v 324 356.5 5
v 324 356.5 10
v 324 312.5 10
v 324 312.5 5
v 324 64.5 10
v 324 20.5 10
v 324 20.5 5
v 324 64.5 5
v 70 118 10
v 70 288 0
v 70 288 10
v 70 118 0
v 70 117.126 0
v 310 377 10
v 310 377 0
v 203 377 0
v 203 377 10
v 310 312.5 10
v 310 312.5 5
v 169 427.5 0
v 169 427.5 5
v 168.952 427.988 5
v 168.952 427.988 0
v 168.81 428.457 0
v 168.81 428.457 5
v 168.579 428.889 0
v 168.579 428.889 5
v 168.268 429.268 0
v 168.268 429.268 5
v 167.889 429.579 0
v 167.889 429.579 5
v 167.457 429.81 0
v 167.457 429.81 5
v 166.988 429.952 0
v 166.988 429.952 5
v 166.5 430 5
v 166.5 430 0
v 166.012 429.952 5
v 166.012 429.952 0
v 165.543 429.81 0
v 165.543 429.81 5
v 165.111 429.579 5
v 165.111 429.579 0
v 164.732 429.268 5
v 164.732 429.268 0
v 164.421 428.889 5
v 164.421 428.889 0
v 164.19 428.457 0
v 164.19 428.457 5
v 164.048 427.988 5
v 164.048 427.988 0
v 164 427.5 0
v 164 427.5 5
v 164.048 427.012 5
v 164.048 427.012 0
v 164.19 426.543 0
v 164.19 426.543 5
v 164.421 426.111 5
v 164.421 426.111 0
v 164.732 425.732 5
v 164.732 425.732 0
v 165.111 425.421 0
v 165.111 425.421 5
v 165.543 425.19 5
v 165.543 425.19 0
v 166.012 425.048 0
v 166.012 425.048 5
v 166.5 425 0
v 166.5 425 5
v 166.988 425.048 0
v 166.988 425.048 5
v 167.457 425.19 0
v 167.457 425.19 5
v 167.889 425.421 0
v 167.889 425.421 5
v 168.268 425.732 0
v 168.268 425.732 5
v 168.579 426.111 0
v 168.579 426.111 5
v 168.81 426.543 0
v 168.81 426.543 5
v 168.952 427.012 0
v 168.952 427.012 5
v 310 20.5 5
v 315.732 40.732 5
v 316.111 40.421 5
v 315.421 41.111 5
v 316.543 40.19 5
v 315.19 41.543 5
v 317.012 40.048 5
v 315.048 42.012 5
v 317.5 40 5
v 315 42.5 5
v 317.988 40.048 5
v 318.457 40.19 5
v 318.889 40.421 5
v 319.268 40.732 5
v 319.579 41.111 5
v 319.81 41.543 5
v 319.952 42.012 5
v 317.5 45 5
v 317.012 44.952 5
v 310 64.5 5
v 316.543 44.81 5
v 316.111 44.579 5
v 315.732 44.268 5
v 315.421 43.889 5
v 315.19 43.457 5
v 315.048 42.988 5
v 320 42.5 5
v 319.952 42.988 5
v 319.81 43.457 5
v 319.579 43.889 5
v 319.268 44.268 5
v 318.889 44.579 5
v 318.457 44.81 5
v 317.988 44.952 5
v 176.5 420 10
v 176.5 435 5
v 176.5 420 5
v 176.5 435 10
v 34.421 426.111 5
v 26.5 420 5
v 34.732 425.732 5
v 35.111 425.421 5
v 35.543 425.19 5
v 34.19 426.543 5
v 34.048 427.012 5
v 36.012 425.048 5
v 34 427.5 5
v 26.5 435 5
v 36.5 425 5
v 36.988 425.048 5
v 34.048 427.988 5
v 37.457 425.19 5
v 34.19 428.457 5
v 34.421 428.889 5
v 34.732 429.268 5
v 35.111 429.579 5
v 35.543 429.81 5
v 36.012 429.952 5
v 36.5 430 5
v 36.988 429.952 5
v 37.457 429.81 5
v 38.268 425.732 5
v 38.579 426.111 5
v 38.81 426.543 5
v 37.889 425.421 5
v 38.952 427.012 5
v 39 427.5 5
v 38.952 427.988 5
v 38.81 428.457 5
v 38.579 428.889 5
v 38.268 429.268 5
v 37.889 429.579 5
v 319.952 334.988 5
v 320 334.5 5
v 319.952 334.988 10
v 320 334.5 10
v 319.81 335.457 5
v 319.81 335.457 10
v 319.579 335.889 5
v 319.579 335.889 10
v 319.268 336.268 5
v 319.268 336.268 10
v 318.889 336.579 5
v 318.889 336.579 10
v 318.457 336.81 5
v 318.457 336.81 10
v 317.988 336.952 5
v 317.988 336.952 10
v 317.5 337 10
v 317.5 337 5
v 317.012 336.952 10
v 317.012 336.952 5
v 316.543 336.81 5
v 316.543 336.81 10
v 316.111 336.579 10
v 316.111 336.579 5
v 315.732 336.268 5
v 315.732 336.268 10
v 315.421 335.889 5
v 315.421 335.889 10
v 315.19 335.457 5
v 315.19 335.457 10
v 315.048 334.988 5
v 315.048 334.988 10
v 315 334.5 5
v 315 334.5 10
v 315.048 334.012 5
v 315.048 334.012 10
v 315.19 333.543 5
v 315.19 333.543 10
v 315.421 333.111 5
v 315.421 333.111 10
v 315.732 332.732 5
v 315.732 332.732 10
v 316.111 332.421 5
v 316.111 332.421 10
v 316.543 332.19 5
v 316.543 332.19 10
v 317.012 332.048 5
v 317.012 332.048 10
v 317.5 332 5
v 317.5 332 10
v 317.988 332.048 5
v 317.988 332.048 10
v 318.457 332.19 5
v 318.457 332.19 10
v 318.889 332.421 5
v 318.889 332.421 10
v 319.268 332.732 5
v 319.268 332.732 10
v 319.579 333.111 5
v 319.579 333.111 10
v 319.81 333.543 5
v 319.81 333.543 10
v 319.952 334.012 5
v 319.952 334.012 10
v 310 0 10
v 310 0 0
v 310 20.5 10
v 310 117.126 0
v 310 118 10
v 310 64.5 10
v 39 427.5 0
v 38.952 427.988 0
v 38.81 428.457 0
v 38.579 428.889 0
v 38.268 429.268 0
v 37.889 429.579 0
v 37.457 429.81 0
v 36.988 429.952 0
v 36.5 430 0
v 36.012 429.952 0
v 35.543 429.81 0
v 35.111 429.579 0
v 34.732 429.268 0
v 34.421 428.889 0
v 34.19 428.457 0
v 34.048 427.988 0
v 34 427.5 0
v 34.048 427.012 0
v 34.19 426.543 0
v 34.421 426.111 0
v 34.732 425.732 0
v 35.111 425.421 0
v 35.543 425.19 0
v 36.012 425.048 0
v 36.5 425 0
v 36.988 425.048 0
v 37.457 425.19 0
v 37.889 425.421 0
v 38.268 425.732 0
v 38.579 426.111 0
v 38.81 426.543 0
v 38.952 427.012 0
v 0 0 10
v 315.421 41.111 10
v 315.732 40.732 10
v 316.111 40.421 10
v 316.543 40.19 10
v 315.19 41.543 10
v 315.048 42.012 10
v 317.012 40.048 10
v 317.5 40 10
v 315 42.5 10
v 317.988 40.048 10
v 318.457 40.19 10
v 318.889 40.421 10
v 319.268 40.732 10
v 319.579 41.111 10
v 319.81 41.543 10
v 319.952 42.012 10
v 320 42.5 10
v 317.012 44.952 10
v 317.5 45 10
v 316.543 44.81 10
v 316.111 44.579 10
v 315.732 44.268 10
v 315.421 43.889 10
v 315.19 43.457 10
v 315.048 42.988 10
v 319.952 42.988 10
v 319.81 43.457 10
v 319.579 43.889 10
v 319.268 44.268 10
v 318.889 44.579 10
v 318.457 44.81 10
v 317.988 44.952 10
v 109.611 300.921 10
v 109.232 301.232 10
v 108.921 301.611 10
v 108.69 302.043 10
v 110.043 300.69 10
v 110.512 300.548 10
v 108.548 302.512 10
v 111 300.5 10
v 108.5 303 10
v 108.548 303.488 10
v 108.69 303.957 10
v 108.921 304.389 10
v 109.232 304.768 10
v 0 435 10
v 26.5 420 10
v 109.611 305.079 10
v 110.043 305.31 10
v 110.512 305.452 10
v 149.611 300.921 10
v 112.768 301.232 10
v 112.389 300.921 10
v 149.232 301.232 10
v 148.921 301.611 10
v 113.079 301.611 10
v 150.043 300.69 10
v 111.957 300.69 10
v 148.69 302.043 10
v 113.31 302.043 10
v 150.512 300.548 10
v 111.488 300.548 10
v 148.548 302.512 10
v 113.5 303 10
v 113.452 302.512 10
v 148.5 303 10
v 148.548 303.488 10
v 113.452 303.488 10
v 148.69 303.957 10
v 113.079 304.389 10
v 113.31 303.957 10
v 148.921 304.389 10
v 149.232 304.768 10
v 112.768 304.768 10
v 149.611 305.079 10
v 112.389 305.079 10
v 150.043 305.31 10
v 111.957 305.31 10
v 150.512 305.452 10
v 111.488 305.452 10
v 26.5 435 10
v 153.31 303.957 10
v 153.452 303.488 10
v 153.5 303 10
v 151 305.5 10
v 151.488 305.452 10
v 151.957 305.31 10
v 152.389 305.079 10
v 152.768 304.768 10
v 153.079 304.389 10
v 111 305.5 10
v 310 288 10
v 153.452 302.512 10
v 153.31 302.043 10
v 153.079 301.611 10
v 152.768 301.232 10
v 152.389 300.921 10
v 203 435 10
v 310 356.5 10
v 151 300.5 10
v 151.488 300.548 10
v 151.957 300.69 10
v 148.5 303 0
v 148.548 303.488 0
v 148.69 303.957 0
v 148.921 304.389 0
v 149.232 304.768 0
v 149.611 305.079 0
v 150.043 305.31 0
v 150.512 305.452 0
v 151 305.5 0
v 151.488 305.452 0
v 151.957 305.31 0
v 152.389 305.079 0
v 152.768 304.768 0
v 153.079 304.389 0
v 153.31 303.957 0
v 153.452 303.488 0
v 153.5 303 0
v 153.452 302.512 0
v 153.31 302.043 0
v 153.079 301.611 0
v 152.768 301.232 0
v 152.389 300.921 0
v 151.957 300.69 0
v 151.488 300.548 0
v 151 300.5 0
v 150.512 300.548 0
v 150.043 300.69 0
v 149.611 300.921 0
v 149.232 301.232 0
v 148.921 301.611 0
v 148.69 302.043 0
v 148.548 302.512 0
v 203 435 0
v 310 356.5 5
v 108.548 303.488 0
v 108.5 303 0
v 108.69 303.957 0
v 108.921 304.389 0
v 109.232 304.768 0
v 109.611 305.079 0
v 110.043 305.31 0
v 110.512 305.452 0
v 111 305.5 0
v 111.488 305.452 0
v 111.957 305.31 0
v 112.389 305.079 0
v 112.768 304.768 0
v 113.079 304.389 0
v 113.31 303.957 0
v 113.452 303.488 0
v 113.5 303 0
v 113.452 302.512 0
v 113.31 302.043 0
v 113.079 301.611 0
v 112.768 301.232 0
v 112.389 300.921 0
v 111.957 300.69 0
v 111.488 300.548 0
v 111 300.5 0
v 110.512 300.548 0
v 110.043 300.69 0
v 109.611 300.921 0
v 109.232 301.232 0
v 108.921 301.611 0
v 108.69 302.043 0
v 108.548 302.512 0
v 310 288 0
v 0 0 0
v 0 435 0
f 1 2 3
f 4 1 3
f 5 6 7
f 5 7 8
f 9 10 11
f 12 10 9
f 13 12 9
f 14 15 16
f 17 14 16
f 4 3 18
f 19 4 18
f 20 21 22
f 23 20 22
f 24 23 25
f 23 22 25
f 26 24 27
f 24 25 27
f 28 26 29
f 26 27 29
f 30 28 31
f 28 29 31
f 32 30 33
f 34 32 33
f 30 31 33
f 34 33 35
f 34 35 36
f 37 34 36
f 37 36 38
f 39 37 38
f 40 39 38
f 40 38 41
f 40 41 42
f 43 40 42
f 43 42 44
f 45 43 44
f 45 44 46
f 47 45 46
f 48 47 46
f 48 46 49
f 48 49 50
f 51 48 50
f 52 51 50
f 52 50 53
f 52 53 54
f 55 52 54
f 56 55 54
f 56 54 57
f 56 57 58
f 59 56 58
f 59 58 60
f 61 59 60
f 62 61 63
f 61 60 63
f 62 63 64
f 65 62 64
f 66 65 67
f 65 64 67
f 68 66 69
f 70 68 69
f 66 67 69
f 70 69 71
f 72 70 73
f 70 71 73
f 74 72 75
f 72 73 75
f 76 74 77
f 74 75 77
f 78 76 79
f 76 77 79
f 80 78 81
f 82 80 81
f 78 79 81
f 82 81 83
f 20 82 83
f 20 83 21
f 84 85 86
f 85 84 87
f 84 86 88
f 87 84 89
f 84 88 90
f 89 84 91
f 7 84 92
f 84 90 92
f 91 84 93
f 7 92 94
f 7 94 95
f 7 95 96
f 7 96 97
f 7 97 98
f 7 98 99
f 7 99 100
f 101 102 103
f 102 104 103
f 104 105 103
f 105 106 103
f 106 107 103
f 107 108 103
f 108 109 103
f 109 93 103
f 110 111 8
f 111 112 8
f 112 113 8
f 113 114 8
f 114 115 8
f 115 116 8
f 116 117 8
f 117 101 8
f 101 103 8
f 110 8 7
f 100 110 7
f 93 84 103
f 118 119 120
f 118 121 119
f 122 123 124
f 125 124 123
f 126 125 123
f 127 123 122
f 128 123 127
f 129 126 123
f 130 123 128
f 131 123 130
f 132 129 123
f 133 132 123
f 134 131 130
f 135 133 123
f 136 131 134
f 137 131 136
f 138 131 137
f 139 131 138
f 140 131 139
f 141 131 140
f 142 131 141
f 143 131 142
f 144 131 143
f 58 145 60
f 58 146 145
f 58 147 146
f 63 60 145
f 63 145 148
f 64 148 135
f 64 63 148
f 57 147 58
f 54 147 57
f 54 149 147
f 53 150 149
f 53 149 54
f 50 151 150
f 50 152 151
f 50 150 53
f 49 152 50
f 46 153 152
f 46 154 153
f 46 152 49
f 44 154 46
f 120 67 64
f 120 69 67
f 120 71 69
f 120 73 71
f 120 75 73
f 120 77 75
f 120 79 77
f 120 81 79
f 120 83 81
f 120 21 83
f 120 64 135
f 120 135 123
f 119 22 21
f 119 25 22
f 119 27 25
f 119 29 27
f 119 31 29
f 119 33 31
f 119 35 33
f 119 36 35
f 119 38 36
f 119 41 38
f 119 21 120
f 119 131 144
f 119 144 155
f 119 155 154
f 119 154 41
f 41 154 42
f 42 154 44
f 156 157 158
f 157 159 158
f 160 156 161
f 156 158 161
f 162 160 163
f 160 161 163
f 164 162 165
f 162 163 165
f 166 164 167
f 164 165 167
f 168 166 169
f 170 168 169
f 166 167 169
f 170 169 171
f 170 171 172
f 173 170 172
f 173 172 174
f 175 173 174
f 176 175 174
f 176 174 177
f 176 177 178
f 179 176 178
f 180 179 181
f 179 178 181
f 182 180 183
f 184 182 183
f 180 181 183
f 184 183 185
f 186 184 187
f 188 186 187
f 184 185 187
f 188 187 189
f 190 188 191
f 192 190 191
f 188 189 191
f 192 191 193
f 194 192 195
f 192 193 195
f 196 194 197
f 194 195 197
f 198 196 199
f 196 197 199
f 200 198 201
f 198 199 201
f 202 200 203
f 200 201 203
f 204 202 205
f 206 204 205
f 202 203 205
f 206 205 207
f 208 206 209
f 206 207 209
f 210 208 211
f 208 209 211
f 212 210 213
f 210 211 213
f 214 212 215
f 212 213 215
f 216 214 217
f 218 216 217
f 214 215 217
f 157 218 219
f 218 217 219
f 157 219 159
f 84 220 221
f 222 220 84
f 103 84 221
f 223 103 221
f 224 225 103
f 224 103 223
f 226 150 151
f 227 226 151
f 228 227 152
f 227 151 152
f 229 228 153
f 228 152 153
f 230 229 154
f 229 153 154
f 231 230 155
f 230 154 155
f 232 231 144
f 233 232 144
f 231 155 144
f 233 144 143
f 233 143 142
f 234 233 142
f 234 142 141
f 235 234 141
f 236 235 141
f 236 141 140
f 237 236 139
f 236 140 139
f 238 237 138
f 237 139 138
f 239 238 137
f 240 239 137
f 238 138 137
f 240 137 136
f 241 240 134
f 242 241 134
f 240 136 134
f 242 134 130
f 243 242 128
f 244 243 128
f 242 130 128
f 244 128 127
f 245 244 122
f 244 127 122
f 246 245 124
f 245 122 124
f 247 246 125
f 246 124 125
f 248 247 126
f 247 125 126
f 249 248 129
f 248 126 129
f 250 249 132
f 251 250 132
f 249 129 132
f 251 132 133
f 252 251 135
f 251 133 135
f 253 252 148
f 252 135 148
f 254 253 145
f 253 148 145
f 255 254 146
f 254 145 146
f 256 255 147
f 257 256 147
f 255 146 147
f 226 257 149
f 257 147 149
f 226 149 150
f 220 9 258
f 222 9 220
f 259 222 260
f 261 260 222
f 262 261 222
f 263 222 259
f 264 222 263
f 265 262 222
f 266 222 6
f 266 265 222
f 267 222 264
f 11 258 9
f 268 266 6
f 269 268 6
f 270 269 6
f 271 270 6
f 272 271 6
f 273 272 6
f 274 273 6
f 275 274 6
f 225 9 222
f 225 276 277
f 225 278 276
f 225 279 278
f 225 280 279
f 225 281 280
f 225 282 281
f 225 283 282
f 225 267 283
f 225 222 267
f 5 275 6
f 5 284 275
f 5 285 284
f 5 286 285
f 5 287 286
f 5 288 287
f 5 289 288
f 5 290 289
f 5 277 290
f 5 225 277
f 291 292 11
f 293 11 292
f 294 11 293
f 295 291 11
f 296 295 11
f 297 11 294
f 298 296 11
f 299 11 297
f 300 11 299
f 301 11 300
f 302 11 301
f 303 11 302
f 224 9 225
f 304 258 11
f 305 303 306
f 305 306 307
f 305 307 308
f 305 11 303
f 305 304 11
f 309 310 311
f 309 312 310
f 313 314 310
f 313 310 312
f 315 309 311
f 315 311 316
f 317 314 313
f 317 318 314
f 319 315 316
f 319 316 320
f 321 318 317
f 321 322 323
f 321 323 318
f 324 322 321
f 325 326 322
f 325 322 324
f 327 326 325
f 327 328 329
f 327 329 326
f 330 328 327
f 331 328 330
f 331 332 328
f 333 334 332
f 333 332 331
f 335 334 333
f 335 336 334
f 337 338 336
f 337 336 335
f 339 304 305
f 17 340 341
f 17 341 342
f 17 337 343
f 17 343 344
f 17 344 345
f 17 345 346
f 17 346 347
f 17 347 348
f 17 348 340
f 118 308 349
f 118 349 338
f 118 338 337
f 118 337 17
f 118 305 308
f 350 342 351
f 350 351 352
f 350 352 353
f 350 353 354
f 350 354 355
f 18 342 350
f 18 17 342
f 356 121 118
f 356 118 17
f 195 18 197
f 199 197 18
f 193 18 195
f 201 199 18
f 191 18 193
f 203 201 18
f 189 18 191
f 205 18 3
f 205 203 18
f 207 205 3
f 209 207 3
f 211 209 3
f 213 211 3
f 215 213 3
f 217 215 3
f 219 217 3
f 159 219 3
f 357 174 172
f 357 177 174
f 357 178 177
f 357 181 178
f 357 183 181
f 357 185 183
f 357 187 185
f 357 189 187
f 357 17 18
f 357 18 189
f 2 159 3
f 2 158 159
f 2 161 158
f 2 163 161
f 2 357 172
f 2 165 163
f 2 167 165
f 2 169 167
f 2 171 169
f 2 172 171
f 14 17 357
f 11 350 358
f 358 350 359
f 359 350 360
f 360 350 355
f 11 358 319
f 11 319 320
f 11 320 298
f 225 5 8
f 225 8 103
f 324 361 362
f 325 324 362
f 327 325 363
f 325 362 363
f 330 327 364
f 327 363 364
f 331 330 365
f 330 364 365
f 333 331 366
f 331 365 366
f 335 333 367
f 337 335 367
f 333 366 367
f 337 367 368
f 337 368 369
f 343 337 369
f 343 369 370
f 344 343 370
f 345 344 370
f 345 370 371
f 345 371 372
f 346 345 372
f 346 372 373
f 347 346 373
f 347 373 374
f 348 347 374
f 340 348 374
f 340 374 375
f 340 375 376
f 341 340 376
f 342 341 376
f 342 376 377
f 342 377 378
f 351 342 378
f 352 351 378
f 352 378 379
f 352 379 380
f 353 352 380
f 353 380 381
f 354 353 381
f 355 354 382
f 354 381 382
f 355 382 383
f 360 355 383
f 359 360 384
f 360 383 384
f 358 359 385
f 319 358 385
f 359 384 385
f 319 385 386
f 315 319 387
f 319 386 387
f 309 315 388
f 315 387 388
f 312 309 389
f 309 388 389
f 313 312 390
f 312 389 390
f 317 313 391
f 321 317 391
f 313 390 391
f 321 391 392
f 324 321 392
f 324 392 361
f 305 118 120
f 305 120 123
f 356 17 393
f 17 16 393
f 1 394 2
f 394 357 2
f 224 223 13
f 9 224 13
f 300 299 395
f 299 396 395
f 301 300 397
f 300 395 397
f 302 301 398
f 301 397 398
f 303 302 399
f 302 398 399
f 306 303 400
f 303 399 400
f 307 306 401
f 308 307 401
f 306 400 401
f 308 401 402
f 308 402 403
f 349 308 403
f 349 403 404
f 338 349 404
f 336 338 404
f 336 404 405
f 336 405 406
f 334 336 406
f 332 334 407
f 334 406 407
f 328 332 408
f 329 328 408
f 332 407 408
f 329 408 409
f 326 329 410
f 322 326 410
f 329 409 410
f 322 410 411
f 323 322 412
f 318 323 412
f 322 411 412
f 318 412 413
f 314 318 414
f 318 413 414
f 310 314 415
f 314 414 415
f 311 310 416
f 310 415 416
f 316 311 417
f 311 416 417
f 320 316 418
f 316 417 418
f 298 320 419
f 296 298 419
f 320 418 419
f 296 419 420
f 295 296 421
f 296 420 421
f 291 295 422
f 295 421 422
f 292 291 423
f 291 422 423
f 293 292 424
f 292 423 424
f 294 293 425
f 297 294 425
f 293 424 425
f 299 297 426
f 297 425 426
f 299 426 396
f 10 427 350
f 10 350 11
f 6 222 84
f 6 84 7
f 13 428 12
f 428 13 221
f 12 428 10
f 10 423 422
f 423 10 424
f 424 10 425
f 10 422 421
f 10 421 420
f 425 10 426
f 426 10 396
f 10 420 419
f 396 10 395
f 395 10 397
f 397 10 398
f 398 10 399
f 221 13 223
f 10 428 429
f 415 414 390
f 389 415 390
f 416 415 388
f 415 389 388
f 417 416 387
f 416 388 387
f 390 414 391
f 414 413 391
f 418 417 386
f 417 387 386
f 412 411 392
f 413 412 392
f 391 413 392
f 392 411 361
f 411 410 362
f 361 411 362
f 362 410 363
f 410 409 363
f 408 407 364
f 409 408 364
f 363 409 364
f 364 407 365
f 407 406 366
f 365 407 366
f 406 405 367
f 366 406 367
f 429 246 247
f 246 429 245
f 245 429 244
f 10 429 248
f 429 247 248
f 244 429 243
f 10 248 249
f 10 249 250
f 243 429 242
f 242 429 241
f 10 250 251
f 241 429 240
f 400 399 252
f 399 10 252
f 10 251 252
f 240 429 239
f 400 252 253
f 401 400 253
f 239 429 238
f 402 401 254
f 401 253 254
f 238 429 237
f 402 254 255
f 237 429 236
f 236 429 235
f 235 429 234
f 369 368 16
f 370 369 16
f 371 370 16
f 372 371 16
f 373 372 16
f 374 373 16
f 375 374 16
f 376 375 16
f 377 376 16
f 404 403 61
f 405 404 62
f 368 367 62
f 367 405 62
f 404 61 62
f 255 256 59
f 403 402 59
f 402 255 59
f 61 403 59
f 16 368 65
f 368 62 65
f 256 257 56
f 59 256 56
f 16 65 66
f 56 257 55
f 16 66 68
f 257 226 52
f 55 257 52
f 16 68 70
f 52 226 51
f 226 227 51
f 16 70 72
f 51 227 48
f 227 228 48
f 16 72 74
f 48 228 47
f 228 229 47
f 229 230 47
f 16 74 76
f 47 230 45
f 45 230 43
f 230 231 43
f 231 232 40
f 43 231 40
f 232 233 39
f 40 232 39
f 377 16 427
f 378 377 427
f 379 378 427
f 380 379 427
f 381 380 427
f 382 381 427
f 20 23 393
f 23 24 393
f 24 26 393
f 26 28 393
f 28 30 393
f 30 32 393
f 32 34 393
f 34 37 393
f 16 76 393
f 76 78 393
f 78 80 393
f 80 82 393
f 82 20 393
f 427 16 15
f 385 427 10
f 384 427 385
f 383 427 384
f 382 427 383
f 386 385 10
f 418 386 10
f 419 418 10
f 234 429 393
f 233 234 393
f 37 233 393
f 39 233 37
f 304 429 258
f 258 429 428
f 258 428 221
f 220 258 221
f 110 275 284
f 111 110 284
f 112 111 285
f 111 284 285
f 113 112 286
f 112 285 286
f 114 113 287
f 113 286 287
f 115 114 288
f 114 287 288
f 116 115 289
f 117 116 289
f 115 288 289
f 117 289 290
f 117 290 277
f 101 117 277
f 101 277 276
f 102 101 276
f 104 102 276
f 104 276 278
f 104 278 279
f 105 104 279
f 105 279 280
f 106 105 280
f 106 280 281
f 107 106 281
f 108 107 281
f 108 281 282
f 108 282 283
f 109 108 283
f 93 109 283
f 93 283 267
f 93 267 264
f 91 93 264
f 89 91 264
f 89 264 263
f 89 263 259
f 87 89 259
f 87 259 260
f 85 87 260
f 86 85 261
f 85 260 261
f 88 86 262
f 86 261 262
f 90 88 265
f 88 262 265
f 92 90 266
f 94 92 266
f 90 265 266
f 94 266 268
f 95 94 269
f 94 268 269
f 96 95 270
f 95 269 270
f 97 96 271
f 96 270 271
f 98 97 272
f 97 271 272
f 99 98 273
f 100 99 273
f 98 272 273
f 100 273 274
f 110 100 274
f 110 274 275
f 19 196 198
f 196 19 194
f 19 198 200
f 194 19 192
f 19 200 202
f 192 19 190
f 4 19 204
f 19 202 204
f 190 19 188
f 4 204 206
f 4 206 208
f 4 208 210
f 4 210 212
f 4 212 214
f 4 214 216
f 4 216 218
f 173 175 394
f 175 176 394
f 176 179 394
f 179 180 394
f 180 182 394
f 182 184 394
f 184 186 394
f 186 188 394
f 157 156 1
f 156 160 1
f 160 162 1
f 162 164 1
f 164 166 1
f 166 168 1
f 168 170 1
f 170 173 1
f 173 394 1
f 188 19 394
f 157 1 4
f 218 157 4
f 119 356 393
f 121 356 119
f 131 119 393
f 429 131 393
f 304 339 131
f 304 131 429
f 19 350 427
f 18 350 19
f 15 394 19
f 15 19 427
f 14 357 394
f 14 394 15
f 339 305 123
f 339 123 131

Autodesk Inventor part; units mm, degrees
ref_plane "YZ Plane" through (0, 0, 0) normal (1, 0, 0) x (0, 1, 0)
ref_plane "XZ Plane" through (0, 0, 0) normal (0, 1, 0) x (-1, 0, 0)
ref_plane "XY Plane" through (0, 0, 0) normal (0, 0, 1) x (1, 0, 0)
sketch "Sketch1" plane through (0, 0, 0) normal (0, 0, 1) x (1, 0, 0)
  line L0 (0, 0) -> (620, 0)
  line L1 (620, 0) -> (620, 620)
  line L2 (620, 620) -> (0, 620)
  line L3 (0, 620) -> (0, 0)
  line L4 (203, 491) -> (417, 491)
  line L5 (417, 491) -> (417, 377)
  line L6 (417, 377) -> (203, 377)
  line L7 (203, 377) -> (203, 491)
  point P0 (310, 491)
  point P1 (310, 620)
  dimension "d0" = 620
  dimension "d1" = 620
  dimension "d2" = 214
  dimension "d3" = 114
  dimension "d4" = 129
extrude "Extrusion1" add sketch "Sketch1" along normal blind 10
sketch "Sketch2" plane through (0, 0, 10) normal (0, 0, 1) x (1, 0, 0)
  line L0 (0, 0) -> (310, 0)
  line L1 (310, 0) -> (310, 435)
  line L2 (310, 435) -> (0, 435)
  line L3 (0, 435) -> (0, 0)
  line L4 (620, 620) -> (0, 620) projected
  line L5 (0, 435) -> (620, 435)
  line L6 (620, 435) -> (620, 620)
  line L7 (620, 620) -> (0, 620)
  line L8 (0, 620) -> (0, 435)
  line L9 (310, 435) -> (620, 435)
  line L10 (620, 435) -> (620, 0)
  line L11 (620, 0) -> (310, 0)
  line L12 (310, 0) -> (310, 435)
  point P0 (310, 620)
  dimension "d7" = 435
extrude "Extrusion2" cut sketch "Sketch2" against normal through all contours L1 L5 L10 L11 | L8 L4 L6 L5 L2
sketch "Sketch3" plane through (0, 0, 10) normal (0, 0, 1) x (1, 0, 0)
  line L0 (310, 0) -> (310, 377) projected
  line L1 (310, 356.5) -> (324, 356.5)
  line L2 (324, 356.5) -> (324, 312.5)
  line L3 (324, 312.5) -> (310, 312.5)
  line L4 (310, 312.5) -> (310, 356.5)
  circle A0 centre (317.5, 334.5) radius 2.5
  line L5 (203, 377) -> (310, 377) projected
  line L6 (310, 20.5) -> (324, 20.5)
  line L7 (324, 20.5) -> (324, 64.5)
  line L8 (324, 64.5) -> (310, 64.5)
  line L9 (310, 64.5) -> (310, 20.5)
  circle A1 centre (317.5, 42.5) radius 2.5
  line L10 (0, 0) -> (310, 0) projected
  dimension "d32" = 14
  dimension "d33" = 44
  dimension "d34" = 5
  dimension "d35" = 7.5
  dimension "d36" = 22
  dimension "d37" = 20.5
  dimension "d38" = 14
  dimension "d39" = 44
  dimension "d40" = 5
  dimension "d41" = 7.5
  dimension "d42" = 20.5
  dimension "d43" = 22
extrude "Extrusion3" add sketch "Sketch3" against normal blind 5
sketch "Sketch4" plane through (0, 0, 10) normal (0, 0, 1) x (1, 0, 0)
  line L0 (203, 435) -> (0, 435) projected
  line L1 (26.5, 435) -> (176.5, 435)
  line L2 (176.5, 435) -> (176.5, 420)
  line L3 (176.5, 420) -> (26.5, 420)
  line L4 (26.5, 420) -> (26.5, 435)
  point P0 (0, 0)
  point P1 (101.5, 435)
  dimension "d18" = 150
  dimension "d19" = 15
extrude "Extrusion4" cut sketch "Sketch4" against normal blind 5
sketch "Sketch5" plane through (0, 0, 5) normal (0, 0, 1) x (1, 0, 0)
  circle A0 centre (36.5, 427.5) radius 2.5
  circle A1 centre (166.5, 427.5) radius 2.5
  line L0 (26.5, 420) -> (26.5, 435) projected
  line L1 (176.5, 435) -> (176.5, 420) projected
  point P0 (0, 0)
  point P1 (26.5, 427.5)
  dimension "d22" = 5
  dimension "d23" = 5
  dimension "d24" = 10
  dimension "d25" = 10
extrude "Extrusion5" cut sketch "Sketch5" against normal through all
sketch "Sketch6" plane through (0, 0, 0) normal (0, 0, -1) x (-1, 0, 0)
  line L0 (-310, 64.5) -> (-310, 312.5) projected
  line L1 (-310, 288) -> (-70, 288)
  line L2 (-70, 288) -> (-70, 118)
  line L3 (-70, 118) -> (-310, 118)
  line L4 (-310, 118) -> (-310, 288)
  line L5 (-310, 312.5) -> (-324, 312.5) projected
  point P0 (0, 0)
  dimension "d44" = 240
  dimension "d45" = 170
  dimension "d55" = 24.5
extrude "Extrusion6" cut sketch "Sketch6" against normal through all
sketch "Sketch7" plane through (0, 0, 0) normal (0, 0, -1) x (-1, 0, 0)
  circle A0 centre (-111, 303) radius 2.5
  circle A1 centre (-151, 303) radius 2.5
  line L0 (-70, 288) -> (-70, 118) projected
  line L1 (-310, 288) -> (-70, 288) projected
  point P0 (0, 0)
  dimension "d48" = 5
  dimension "d49" = 5
  dimension "d50" = 40
  dimension "d51" = 41
  dimension "d52" = 15
extrude "Extrusion7" cut sketch "Sketch7" against normal through all
chamfer "Chamfer1" distance 10 angle 5 1 edges at (190, 118, 0) measured on face at (150, 118, 3.3333)
properties part number "TC001b" material "ABS Plastic"
